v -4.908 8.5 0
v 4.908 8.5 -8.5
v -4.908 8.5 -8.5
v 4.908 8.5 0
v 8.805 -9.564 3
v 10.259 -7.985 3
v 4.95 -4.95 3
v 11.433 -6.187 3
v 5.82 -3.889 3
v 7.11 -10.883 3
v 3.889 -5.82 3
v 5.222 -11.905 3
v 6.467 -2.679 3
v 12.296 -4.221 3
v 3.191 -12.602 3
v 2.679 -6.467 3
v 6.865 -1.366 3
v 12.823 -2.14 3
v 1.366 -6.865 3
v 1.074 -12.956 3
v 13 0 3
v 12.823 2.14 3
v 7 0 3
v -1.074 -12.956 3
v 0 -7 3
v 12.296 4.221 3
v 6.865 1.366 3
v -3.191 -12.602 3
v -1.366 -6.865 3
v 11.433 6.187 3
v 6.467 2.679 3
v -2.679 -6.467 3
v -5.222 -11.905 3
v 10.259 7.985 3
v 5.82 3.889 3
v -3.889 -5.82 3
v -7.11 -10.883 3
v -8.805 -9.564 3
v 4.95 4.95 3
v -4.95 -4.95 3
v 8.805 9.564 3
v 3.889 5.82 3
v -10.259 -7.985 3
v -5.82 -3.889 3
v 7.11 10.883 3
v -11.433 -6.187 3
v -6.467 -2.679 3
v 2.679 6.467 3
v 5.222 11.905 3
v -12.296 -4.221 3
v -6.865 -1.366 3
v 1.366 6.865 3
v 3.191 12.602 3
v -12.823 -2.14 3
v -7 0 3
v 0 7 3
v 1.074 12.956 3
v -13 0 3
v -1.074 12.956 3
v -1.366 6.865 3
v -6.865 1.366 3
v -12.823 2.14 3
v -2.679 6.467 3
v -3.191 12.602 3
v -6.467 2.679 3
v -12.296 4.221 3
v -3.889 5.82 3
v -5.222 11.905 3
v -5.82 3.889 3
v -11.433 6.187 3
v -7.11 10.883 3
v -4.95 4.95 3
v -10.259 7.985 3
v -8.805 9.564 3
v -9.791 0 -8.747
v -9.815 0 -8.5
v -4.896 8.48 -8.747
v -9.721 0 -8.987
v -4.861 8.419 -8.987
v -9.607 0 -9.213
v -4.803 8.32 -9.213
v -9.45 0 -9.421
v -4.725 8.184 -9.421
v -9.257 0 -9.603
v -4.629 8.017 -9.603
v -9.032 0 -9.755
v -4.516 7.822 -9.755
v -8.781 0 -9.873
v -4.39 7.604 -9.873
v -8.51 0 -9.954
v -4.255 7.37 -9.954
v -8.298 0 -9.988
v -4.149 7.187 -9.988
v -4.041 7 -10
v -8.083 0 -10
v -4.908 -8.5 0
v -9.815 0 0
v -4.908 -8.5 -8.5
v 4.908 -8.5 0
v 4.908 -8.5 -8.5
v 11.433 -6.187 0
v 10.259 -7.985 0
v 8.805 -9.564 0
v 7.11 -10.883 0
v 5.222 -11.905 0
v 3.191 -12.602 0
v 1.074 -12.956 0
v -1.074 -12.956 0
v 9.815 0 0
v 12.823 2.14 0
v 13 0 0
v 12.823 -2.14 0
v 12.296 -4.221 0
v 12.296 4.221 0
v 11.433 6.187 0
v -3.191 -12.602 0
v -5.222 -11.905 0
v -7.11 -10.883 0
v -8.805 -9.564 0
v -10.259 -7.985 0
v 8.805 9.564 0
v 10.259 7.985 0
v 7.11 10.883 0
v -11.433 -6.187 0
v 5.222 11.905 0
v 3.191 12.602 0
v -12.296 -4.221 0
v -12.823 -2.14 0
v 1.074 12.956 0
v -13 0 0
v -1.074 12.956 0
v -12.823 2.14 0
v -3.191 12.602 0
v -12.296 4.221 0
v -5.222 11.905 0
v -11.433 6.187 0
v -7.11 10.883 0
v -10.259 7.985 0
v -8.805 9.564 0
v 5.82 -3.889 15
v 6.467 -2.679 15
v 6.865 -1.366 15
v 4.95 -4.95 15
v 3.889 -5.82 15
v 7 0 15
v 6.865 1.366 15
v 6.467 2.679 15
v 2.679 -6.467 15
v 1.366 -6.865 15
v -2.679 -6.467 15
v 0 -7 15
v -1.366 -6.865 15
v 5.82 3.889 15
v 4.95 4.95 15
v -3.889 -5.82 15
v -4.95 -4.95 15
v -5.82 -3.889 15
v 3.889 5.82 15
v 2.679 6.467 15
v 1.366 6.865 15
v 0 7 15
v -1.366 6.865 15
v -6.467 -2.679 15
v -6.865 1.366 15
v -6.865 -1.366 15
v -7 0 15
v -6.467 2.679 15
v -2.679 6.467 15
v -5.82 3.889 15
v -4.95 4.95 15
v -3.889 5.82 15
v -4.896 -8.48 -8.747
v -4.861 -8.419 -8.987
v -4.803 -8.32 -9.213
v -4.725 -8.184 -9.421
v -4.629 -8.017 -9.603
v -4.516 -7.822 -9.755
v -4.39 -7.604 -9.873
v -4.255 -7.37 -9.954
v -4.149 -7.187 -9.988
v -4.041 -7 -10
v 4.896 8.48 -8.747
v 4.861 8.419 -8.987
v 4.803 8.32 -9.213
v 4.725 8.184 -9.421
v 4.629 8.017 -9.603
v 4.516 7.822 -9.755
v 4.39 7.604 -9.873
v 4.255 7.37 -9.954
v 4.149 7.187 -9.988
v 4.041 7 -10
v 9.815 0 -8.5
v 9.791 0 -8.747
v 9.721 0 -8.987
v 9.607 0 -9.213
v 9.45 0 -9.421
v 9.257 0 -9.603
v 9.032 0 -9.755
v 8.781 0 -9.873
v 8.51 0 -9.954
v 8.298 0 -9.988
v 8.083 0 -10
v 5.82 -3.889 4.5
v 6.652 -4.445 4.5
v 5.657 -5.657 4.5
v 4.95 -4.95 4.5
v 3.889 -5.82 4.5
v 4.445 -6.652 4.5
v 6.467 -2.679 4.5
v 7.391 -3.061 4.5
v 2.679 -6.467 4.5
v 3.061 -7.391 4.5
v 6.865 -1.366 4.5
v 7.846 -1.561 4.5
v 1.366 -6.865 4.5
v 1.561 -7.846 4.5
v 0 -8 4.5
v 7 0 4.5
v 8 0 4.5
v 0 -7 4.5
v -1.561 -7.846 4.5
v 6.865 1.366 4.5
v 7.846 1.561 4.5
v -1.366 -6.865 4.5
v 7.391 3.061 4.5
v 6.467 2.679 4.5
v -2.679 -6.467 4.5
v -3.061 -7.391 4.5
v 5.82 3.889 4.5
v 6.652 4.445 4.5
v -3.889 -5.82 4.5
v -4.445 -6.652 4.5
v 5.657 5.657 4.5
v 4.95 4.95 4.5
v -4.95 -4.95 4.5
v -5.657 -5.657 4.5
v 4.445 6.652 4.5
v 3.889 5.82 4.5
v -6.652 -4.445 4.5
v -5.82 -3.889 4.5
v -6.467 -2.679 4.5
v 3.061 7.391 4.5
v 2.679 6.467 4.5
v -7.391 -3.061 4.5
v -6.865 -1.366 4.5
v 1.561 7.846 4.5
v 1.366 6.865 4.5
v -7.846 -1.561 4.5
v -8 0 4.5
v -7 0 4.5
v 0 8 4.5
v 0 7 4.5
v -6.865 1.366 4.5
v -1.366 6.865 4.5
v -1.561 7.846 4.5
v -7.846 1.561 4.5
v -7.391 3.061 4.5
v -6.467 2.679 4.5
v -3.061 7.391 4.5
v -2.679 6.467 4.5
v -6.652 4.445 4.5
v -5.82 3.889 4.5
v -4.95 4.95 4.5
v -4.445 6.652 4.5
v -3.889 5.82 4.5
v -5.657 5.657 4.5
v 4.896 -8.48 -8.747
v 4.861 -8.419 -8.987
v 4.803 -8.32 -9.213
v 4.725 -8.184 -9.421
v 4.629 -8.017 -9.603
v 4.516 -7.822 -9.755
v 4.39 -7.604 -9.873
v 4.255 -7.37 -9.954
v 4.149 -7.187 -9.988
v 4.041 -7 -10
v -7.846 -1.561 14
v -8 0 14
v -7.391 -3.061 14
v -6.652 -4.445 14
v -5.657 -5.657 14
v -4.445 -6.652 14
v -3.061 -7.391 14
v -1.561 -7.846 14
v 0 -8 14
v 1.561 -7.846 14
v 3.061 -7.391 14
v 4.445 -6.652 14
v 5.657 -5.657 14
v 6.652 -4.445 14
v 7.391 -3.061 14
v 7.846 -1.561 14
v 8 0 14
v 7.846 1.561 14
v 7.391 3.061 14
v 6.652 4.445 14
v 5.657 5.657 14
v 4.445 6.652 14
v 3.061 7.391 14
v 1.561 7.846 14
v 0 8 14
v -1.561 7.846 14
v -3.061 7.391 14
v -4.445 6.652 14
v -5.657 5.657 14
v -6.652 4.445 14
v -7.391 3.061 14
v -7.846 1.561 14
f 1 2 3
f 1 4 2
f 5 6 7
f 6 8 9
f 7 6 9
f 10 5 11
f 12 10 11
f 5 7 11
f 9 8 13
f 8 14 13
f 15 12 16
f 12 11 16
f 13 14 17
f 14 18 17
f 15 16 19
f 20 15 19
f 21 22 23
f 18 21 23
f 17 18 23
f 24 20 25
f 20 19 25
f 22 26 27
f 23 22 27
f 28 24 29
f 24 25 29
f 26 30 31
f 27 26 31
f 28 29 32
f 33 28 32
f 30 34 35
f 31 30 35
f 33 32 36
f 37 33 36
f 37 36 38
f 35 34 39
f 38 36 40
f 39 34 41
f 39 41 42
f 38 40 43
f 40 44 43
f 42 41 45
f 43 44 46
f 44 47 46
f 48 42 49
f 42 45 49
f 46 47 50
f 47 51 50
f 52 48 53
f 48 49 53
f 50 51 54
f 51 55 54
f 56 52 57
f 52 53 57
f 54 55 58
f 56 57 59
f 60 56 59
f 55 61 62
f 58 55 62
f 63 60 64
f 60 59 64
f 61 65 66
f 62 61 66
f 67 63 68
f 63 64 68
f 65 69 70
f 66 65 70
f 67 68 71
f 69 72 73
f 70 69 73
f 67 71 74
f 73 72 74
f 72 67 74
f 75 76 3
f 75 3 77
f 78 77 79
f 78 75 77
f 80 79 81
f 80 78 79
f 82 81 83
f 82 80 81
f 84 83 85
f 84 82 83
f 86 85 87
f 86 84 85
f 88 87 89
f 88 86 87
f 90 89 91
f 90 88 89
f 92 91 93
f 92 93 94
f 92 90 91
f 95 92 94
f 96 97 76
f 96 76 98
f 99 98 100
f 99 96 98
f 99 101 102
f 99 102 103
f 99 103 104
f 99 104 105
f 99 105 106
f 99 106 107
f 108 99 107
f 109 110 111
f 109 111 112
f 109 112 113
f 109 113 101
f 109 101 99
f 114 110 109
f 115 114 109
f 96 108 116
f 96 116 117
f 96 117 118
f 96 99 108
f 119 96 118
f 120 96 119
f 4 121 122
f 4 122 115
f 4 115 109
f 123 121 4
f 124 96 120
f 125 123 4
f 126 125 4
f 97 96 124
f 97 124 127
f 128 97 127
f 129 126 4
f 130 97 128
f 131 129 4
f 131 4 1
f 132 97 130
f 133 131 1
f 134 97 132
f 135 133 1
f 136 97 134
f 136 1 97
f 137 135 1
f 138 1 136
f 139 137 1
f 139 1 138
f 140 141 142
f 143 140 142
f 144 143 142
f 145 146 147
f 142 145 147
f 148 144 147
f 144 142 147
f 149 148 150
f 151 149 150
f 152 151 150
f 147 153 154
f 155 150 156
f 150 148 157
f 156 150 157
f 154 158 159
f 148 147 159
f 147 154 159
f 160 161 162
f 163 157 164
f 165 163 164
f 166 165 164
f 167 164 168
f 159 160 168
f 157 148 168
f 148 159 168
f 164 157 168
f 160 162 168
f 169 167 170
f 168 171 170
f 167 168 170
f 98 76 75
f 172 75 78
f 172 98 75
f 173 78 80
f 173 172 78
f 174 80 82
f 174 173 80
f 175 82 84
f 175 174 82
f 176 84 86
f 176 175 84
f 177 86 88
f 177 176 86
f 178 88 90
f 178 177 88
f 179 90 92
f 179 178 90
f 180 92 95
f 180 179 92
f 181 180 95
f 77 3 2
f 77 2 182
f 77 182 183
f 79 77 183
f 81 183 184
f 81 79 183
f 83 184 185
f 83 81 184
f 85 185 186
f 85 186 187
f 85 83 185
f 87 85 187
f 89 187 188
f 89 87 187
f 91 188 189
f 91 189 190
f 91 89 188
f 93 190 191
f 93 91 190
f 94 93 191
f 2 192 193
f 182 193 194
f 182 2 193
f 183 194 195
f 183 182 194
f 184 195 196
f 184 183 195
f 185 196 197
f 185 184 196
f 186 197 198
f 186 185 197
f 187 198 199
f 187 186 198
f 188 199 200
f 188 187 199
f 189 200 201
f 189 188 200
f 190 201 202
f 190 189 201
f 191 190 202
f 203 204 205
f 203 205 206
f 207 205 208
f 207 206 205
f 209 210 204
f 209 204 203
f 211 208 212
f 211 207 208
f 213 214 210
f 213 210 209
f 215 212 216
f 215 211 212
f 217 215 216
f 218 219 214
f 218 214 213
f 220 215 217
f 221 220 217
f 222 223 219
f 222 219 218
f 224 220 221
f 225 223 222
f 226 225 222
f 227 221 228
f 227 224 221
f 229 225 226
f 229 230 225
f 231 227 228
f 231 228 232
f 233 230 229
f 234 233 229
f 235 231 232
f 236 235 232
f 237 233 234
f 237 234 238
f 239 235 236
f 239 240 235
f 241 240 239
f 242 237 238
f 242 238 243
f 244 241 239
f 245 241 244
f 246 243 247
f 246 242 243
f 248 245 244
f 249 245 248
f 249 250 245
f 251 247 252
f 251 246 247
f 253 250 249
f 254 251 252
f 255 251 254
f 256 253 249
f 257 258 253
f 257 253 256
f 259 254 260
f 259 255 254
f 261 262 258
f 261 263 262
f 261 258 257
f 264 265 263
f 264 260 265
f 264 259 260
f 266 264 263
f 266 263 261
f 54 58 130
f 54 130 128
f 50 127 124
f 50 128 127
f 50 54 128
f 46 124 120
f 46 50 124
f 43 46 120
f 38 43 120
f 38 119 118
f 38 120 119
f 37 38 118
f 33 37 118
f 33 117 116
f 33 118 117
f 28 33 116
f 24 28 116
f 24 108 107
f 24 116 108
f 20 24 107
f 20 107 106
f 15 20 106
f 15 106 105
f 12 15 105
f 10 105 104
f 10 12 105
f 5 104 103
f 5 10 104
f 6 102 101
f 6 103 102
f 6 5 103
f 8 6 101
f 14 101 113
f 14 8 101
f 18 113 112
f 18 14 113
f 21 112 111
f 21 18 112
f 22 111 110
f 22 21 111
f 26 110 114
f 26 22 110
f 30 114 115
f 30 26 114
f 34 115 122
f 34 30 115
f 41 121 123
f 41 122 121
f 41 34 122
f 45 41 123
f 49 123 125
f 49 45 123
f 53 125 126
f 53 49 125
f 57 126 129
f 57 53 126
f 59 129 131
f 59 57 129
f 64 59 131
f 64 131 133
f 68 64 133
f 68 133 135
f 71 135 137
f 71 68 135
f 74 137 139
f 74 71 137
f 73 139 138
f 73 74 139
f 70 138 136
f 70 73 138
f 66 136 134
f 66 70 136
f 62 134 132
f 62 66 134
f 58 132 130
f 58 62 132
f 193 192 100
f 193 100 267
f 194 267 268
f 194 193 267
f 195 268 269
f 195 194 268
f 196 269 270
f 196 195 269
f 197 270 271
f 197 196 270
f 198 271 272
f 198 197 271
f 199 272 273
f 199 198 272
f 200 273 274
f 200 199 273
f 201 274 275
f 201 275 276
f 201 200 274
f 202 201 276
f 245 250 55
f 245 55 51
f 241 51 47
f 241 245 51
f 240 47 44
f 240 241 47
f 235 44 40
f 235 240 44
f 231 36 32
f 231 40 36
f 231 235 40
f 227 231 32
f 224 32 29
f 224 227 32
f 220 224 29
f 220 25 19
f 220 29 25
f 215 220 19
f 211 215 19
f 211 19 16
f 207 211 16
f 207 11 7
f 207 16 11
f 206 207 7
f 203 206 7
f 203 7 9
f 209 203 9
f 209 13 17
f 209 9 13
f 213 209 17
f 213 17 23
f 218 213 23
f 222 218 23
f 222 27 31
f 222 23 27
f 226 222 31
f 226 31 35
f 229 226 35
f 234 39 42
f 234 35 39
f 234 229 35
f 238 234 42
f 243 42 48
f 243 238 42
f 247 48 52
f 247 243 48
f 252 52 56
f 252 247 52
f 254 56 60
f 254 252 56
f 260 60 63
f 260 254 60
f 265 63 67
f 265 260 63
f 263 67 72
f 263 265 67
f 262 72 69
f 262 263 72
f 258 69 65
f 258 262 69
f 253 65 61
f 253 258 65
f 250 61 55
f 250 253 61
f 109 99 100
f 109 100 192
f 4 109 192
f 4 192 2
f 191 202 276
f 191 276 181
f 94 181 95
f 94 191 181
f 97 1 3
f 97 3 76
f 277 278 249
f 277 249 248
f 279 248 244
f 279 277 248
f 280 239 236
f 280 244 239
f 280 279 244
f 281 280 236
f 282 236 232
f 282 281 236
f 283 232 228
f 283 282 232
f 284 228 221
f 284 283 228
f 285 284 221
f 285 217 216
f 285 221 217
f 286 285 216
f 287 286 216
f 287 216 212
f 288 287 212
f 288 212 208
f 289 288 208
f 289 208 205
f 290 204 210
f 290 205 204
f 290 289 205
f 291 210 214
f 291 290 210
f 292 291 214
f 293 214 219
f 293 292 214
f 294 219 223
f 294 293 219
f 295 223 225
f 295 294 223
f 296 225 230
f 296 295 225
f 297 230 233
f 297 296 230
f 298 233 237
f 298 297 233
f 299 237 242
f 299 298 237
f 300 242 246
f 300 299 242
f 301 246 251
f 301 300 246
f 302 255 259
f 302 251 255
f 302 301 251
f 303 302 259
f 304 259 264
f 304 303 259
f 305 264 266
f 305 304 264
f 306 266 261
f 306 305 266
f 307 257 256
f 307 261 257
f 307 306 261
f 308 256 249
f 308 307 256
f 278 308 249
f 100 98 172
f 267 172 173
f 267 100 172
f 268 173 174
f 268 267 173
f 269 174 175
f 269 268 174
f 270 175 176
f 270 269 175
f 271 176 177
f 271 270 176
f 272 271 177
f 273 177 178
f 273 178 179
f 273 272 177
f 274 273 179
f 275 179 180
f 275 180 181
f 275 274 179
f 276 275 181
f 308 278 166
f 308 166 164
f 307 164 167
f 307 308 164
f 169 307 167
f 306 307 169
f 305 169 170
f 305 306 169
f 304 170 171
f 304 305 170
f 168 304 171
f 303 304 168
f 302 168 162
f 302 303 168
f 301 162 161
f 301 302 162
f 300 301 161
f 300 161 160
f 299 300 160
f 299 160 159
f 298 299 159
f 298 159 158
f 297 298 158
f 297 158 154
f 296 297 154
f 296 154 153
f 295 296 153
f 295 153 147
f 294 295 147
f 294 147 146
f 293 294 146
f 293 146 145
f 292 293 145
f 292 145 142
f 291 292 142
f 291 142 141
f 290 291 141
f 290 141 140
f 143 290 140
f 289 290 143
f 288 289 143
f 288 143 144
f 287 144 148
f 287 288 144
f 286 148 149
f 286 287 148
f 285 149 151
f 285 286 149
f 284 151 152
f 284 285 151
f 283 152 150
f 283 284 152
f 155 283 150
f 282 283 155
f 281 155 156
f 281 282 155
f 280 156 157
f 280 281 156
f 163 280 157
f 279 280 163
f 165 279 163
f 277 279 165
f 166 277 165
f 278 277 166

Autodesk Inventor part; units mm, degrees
ref_plane "YZ Plane" through (0, 0, 0) normal (1, 0, 0) x (0, 1, 0)
ref_plane "XZ Plane" through (0, 0, 0) normal (0, 1, 0) x (-1, 0, 0)
ref_plane "XY Plane" through (0, 0, 0) normal (0, 0, 1) x (1, 0, 0)
sketch "草图1" plane through (0, 0, 0) normal (0, 1, 0) x (-1, 0, 0)
  line L0 (0, 0) -> (13, 0)
  line L1 (13, 0) -> (13, 3)
  line L2 (13, 3) -> (7, 3)
  line L3 (7, 3) -> (7, 4.5)
  line L4 (7, 4.5) -> (8, 4.5)
  line L5 (8, 4.5) -> (8, 15)
  line L6 (8, 15) -> (0, 15)
  line L7 (0, 15) -> (0, 0)
  dimension "d0" = 13
  dimension "d2" = 3
  dimension "d3" = 1.5
  dimension "d4" = 1
  dimension "d5" = 8
  dimension "d6" = 12
revolve "旋转1" add sketch "草图1" angle 360 about axis through (0, 0, 15) along (0, 0, -1)
chamfer "倒角1" distance 1 angle 45 1 edges at (8, 0, 15)
thread "螺纹1" size "M16x1.5" class "6g" standard "GB Metric profile" length 20
sketch "草图2" plane through (0, 0, 0) normal (0, 0, -1) x (-1, 0, 0)
  circle A0 centre (0, 0) radius 8 projected
  line L0 (9.815, 0) -> (4.9075, -8.5)
  line L1 (4.9075, -8.5) -> (-4.9075, -8.5)
  line L2 (-4.9075, -8.5) -> (-9.815, 0)
  line L3 (-9.815, 0) -> (-4.9075, 8.5)
  line L4 (-4.9075, 8.5) -> (4.9075, 8.5)
  line L5 (4.9075, 8.5) -> (9.815, 0)
  point P0 (0, 0)
  dimension "d13" = 17
extrude "拉伸1" add sketch "草图2" along normal blind 10 contours A0 | L0 L1 L2 L3 L4 L5
fillet "圆角1" radius 1.5 6 edges at (0, -8.5, -10) (7.3612, -4.25, -10) (7.3612, 4.25, -10) (0, 8.5, -10) (-7.3612, 4.25, -10) (-7.3612, -4.25, -10)
equation "\"d0\" = 0.5 * D0"
equation "\"d2\" = a"
equation "\"d5\" = 0.5 * d"
equation "\"d6\" = l_"
equation "\"d\" = 16"
equation "\"D0\" = 26"
equation "\"L\" = 23"
equation "\"l_\" = 12"
equation "\"a\" = 3"
equation "\"D\" = 19.6"
equation "\"S_\" = 17"
equation "\"D1\" = 16.2"
equation "\"d1\" = 17"
equation "\"H_\" = 2"
properties part number "排油孔螺塞" material "钢，软"
